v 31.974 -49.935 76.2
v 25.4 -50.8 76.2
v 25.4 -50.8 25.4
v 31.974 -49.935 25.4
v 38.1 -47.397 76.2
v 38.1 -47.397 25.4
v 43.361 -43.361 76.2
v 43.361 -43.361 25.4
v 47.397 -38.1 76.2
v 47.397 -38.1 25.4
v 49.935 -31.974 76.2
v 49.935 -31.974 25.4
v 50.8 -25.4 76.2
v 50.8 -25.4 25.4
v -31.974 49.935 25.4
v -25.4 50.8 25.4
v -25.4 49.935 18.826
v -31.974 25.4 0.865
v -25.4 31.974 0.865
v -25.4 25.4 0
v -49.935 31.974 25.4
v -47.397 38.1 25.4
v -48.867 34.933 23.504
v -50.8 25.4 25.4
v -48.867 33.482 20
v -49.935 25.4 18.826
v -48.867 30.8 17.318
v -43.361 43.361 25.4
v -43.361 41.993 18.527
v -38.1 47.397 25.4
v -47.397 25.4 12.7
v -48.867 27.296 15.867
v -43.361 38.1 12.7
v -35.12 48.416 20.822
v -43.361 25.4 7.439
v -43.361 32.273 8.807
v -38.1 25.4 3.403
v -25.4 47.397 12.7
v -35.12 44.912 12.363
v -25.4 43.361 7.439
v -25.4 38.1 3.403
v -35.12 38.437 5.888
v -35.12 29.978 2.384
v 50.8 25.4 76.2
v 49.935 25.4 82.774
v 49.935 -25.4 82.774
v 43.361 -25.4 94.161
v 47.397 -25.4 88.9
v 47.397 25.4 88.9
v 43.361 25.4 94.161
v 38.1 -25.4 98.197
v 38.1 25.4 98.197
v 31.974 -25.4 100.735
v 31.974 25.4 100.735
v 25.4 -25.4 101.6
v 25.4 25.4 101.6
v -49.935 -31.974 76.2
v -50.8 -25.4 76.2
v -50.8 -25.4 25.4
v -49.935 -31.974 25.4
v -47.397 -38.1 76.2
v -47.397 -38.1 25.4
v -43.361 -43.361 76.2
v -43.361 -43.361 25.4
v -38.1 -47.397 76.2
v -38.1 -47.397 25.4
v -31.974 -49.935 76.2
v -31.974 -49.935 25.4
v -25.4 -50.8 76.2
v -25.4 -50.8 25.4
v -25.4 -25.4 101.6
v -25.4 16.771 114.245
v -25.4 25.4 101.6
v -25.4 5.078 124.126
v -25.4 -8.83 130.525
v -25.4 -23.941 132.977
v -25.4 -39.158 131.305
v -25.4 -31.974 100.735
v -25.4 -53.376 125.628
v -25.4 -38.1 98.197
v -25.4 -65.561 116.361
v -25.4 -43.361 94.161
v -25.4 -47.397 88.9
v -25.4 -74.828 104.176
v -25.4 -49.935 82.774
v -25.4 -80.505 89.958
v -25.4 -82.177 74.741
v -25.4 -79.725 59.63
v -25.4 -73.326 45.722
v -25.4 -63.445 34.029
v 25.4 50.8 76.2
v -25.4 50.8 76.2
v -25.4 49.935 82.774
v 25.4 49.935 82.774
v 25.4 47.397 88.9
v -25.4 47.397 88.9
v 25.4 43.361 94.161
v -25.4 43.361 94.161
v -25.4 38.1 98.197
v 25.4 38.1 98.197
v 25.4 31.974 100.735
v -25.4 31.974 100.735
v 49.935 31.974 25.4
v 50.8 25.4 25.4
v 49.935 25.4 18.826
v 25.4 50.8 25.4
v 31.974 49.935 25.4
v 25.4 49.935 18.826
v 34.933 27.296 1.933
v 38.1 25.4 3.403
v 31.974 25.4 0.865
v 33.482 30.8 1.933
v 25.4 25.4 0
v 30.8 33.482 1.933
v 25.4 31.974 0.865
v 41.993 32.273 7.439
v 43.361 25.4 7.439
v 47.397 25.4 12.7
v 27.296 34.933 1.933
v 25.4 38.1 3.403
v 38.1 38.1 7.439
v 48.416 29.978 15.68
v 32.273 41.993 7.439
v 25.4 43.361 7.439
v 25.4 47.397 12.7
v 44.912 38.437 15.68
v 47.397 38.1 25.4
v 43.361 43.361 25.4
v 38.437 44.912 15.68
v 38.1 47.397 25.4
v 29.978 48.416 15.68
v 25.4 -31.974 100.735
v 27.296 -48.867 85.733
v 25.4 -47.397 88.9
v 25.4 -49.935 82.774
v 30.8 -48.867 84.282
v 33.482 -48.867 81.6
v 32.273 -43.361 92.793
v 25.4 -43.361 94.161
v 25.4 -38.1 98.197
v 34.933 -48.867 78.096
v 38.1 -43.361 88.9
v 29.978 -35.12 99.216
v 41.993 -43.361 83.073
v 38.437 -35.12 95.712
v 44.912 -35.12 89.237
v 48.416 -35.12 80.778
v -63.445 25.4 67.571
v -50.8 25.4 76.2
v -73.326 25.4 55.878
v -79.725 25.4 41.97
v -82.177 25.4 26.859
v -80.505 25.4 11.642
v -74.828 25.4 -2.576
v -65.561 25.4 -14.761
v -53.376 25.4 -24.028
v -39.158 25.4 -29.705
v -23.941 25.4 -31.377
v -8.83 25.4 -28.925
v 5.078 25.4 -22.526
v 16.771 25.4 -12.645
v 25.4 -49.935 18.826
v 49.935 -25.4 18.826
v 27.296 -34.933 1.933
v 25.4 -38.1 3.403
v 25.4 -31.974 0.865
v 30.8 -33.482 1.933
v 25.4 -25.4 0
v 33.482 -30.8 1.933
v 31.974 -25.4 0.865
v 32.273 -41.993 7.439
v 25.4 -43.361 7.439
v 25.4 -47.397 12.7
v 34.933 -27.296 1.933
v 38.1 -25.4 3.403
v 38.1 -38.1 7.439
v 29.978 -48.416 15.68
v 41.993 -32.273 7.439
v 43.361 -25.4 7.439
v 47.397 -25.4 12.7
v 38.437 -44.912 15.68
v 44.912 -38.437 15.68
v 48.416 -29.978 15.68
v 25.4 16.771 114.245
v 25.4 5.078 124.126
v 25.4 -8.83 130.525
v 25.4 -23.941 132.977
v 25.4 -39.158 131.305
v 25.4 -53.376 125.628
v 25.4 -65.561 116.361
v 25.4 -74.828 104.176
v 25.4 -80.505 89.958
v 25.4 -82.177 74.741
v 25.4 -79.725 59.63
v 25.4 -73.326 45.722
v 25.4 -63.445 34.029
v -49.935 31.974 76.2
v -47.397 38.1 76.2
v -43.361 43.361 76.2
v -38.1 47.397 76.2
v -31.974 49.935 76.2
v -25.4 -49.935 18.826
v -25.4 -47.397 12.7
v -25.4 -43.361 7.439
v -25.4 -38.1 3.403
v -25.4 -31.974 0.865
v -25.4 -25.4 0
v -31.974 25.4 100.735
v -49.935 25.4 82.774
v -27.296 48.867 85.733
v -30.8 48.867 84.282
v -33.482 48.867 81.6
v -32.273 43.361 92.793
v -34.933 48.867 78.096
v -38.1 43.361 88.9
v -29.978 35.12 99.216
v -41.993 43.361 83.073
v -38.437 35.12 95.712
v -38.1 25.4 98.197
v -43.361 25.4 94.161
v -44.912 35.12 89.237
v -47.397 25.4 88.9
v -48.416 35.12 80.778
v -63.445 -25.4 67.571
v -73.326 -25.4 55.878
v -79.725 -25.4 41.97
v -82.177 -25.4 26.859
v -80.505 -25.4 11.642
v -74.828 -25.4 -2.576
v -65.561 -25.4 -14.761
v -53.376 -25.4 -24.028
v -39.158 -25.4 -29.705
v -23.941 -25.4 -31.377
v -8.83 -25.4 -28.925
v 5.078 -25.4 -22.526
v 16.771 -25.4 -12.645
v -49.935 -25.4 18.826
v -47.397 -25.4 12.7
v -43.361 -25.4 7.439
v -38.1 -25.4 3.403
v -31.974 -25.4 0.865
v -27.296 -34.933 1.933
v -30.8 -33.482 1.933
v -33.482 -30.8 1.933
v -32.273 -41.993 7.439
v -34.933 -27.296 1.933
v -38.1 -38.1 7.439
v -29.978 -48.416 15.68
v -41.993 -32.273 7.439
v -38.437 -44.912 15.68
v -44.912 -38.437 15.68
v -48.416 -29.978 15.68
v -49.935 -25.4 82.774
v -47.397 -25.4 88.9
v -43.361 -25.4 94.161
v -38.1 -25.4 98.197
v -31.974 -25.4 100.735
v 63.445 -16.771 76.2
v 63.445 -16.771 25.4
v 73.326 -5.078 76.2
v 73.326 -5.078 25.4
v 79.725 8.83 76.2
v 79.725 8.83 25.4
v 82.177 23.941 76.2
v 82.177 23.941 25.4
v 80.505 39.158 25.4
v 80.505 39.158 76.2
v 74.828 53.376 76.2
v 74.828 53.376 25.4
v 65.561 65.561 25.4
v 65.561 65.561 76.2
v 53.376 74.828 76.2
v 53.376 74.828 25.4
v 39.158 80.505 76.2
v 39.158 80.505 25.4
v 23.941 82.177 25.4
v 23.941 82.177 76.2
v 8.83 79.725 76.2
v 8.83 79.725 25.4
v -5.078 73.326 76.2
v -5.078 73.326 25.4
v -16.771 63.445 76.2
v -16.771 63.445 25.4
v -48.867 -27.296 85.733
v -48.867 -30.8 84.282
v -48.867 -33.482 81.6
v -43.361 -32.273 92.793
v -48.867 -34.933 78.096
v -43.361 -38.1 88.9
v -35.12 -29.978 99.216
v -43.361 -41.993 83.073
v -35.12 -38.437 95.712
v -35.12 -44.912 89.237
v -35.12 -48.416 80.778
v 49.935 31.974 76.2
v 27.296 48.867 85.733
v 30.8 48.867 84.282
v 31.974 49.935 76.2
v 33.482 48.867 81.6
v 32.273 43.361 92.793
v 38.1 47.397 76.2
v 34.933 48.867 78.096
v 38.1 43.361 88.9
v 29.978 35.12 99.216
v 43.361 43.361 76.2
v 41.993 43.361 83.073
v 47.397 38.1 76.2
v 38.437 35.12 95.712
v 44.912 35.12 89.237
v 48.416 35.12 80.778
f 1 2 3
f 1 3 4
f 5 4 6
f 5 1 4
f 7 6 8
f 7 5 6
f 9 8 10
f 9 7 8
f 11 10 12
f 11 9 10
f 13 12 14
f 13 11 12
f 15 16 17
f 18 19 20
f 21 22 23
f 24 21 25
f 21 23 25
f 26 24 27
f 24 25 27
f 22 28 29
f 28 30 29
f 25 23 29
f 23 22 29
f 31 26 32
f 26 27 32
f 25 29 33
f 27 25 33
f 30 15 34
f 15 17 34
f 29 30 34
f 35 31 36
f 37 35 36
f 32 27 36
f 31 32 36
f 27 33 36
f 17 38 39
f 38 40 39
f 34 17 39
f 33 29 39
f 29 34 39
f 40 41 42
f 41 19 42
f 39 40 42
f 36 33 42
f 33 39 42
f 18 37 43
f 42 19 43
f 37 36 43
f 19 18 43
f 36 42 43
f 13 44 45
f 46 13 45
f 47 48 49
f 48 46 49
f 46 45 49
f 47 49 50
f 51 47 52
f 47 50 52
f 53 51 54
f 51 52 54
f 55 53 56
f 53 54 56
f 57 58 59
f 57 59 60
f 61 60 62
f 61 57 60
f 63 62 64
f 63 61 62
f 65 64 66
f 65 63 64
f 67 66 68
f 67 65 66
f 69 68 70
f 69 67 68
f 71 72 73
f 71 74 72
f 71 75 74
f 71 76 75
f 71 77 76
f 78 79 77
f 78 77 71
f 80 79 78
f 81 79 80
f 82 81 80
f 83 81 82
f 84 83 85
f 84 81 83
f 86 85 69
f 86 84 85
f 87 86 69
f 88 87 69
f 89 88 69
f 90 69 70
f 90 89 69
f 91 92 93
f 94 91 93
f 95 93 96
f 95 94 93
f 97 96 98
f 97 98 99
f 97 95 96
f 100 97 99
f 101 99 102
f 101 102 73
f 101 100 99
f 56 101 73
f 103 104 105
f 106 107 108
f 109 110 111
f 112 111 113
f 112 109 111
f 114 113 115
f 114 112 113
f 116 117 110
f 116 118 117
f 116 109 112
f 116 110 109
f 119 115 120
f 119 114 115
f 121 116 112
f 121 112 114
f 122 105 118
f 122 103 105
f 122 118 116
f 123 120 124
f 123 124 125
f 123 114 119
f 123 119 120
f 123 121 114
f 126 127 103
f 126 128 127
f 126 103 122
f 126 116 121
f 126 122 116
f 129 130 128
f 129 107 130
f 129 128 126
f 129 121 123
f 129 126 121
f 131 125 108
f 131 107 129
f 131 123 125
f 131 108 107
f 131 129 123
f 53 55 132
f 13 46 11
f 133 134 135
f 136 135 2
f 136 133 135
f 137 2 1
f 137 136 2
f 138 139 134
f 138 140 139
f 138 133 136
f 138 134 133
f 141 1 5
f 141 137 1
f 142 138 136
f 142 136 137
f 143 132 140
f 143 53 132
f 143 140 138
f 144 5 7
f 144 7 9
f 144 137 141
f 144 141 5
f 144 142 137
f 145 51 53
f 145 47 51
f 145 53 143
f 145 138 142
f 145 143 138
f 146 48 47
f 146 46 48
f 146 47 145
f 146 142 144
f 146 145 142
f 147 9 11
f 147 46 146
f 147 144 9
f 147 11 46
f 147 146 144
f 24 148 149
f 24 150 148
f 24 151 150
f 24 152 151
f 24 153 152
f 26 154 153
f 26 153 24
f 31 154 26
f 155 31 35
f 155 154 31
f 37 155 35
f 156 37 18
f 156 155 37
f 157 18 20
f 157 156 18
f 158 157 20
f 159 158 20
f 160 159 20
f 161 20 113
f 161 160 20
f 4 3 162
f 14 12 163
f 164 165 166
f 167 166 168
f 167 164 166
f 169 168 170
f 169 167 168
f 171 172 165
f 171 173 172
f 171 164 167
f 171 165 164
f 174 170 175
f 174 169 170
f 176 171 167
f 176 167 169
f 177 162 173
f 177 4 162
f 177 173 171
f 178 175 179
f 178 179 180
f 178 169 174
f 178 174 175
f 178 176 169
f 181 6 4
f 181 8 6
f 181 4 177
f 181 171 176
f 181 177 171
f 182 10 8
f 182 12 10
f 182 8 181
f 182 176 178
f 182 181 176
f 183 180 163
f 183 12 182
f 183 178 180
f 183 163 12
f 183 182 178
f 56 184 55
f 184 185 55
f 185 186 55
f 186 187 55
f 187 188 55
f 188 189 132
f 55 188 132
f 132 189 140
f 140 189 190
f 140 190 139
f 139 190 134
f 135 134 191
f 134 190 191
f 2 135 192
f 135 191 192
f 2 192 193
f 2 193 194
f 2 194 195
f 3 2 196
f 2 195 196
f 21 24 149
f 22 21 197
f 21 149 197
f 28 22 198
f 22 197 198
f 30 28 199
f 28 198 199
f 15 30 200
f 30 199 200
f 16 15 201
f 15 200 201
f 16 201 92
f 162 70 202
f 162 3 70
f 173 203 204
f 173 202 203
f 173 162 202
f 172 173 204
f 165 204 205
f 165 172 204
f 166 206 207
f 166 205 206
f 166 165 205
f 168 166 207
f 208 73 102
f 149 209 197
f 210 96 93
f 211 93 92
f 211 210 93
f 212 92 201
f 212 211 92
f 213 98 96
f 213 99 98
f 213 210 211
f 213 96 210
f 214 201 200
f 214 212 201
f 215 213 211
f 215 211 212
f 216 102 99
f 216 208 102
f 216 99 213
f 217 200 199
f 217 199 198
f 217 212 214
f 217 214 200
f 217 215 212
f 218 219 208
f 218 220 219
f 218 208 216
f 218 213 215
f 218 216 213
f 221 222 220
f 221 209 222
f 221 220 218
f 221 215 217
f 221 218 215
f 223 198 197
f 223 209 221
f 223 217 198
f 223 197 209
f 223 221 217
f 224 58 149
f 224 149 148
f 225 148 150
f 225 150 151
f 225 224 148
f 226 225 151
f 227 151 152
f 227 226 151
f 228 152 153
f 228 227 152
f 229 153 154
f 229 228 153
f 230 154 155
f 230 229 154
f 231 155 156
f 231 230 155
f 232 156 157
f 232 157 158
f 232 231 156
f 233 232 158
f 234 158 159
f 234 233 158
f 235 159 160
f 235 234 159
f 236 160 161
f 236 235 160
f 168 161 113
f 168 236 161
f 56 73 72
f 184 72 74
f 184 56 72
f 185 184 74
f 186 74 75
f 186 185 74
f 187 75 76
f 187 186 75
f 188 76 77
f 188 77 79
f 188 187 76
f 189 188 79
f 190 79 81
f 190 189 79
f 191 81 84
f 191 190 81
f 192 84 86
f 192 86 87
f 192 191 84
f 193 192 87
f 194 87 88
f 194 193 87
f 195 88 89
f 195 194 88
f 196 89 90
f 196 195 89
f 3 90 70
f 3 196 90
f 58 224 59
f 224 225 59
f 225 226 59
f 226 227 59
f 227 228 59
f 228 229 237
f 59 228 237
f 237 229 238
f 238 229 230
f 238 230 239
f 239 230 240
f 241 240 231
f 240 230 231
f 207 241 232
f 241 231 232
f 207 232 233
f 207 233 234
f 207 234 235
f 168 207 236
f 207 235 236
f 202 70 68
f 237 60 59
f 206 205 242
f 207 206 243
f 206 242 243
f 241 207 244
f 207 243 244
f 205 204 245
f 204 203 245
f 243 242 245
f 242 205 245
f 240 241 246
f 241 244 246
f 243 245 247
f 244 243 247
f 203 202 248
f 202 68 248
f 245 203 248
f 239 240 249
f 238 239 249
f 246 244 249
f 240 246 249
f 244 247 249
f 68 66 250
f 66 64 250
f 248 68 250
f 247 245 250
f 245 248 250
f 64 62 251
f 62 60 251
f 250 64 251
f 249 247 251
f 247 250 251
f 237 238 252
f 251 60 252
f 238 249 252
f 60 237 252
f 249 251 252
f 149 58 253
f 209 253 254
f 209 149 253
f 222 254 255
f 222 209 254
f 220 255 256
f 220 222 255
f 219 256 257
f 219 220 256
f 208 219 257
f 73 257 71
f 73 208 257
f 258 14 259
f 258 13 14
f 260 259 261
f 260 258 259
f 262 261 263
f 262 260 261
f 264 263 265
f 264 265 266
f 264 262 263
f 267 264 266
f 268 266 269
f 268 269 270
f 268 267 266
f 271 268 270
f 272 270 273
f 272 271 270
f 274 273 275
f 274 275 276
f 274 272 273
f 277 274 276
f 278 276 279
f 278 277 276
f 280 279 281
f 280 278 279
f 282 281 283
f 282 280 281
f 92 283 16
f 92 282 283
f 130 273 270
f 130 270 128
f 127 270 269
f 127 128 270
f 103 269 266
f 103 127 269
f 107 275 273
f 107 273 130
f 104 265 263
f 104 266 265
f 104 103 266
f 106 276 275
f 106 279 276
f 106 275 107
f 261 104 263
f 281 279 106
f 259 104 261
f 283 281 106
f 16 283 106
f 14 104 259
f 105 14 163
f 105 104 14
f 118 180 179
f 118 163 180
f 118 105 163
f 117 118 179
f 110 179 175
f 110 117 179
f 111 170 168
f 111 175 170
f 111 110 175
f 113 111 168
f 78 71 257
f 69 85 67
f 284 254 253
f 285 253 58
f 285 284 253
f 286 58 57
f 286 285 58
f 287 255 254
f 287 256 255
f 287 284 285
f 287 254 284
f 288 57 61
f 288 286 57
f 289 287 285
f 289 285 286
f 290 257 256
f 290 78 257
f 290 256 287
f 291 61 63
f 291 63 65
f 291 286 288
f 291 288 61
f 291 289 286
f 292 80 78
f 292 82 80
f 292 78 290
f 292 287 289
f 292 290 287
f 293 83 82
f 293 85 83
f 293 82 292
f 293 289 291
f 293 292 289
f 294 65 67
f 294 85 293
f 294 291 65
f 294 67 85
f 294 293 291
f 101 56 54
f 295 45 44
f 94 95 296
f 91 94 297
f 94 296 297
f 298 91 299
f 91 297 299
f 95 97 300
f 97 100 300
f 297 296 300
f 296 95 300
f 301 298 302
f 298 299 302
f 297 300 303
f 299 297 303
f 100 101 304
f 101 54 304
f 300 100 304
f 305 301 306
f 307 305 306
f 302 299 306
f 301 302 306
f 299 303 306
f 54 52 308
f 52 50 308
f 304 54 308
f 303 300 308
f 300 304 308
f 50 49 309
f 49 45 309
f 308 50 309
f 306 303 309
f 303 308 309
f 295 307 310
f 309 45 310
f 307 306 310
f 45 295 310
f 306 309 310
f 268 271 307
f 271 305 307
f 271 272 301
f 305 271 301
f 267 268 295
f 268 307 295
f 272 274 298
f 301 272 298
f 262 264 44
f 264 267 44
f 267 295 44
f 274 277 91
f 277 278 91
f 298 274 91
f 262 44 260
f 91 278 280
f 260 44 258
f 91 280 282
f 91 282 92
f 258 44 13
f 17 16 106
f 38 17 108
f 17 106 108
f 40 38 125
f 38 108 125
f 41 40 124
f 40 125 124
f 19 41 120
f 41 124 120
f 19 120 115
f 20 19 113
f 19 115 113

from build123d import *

# Parameters (mm, degrees)
F0_W       = 101.6
F0_H       = 101.6
F1_DEPTH   = 101.6
F2_R       = 25.4
F1_FACE_W  = 50.8
F1_FACE_H  = 50.8
F1_FACE1_W = 50.8
F1_FACE1_H = 50.8
F1_FACE2_W = 50.8
F1_FACE2_H = 50.8


with BuildPart() as f1:
    # F0 (on Top) → F1 (new body)
    with BuildSketch(Plane.XY):
        Rectangle(F0_W, F0_H)
    extrude(amount=F1_DEPTH)

    # F2
    f2_edges = [f1.edges().sort_by_distance(p)[0] for p in [
        (50.8, 0, 101.6),
        (0, -50.8, 101.6),
        (-50.8, 0, 101.6),
        (0, 50.8, 101.6),
        (50.8, 50.8, 50.8),
        (50.8, -50.8, 50.8),
        (-50.8, -50.8, 50.8),
        (0, -50.8, 0),
        (50.8, 0, 0),
        (0, 50.8, 0),
        (-50.8, 50.8, 50.8),
        (-50.8, 0, 0),
    ]]
    fillet(f2_edges, radius=F2_R)

    # F1_face (on face) → F3 (revolve)
    with BuildSketch(Plane.XY.offset(101.6)):
        Rectangle(F1_FACE_W, F1_FACE_H)
    revolve(axis=Axis((-50.8, -25.4, 76.2), (1, 0, 0)))

    # F1_face1 (on face) → F4 (revolve)
    with BuildSketch(Plane(origin=(0, 50.8, 50.8), x_dir=(-1, 0, 0), z_dir=(0, 1, 0))):
        Rectangle(F1_FACE1_W, F1_FACE1_H)
    revolve(axis=Axis((25.4, 25.4, 0), (0, 0, 1)))

    # F1_face2 (on face) → F5 (revolve)
    with BuildSketch(Plane(origin=(-50.8, 0, 50.8), x_dir=(0, -1, 0), z_dir=(-1, 0, 0))):
        Rectangle(F1_FACE2_W, F1_FACE2_H)
    revolve(axis=Axis((-25.4, 50.8, 25.4), (0, -1, 0)))


solid = f1.part
